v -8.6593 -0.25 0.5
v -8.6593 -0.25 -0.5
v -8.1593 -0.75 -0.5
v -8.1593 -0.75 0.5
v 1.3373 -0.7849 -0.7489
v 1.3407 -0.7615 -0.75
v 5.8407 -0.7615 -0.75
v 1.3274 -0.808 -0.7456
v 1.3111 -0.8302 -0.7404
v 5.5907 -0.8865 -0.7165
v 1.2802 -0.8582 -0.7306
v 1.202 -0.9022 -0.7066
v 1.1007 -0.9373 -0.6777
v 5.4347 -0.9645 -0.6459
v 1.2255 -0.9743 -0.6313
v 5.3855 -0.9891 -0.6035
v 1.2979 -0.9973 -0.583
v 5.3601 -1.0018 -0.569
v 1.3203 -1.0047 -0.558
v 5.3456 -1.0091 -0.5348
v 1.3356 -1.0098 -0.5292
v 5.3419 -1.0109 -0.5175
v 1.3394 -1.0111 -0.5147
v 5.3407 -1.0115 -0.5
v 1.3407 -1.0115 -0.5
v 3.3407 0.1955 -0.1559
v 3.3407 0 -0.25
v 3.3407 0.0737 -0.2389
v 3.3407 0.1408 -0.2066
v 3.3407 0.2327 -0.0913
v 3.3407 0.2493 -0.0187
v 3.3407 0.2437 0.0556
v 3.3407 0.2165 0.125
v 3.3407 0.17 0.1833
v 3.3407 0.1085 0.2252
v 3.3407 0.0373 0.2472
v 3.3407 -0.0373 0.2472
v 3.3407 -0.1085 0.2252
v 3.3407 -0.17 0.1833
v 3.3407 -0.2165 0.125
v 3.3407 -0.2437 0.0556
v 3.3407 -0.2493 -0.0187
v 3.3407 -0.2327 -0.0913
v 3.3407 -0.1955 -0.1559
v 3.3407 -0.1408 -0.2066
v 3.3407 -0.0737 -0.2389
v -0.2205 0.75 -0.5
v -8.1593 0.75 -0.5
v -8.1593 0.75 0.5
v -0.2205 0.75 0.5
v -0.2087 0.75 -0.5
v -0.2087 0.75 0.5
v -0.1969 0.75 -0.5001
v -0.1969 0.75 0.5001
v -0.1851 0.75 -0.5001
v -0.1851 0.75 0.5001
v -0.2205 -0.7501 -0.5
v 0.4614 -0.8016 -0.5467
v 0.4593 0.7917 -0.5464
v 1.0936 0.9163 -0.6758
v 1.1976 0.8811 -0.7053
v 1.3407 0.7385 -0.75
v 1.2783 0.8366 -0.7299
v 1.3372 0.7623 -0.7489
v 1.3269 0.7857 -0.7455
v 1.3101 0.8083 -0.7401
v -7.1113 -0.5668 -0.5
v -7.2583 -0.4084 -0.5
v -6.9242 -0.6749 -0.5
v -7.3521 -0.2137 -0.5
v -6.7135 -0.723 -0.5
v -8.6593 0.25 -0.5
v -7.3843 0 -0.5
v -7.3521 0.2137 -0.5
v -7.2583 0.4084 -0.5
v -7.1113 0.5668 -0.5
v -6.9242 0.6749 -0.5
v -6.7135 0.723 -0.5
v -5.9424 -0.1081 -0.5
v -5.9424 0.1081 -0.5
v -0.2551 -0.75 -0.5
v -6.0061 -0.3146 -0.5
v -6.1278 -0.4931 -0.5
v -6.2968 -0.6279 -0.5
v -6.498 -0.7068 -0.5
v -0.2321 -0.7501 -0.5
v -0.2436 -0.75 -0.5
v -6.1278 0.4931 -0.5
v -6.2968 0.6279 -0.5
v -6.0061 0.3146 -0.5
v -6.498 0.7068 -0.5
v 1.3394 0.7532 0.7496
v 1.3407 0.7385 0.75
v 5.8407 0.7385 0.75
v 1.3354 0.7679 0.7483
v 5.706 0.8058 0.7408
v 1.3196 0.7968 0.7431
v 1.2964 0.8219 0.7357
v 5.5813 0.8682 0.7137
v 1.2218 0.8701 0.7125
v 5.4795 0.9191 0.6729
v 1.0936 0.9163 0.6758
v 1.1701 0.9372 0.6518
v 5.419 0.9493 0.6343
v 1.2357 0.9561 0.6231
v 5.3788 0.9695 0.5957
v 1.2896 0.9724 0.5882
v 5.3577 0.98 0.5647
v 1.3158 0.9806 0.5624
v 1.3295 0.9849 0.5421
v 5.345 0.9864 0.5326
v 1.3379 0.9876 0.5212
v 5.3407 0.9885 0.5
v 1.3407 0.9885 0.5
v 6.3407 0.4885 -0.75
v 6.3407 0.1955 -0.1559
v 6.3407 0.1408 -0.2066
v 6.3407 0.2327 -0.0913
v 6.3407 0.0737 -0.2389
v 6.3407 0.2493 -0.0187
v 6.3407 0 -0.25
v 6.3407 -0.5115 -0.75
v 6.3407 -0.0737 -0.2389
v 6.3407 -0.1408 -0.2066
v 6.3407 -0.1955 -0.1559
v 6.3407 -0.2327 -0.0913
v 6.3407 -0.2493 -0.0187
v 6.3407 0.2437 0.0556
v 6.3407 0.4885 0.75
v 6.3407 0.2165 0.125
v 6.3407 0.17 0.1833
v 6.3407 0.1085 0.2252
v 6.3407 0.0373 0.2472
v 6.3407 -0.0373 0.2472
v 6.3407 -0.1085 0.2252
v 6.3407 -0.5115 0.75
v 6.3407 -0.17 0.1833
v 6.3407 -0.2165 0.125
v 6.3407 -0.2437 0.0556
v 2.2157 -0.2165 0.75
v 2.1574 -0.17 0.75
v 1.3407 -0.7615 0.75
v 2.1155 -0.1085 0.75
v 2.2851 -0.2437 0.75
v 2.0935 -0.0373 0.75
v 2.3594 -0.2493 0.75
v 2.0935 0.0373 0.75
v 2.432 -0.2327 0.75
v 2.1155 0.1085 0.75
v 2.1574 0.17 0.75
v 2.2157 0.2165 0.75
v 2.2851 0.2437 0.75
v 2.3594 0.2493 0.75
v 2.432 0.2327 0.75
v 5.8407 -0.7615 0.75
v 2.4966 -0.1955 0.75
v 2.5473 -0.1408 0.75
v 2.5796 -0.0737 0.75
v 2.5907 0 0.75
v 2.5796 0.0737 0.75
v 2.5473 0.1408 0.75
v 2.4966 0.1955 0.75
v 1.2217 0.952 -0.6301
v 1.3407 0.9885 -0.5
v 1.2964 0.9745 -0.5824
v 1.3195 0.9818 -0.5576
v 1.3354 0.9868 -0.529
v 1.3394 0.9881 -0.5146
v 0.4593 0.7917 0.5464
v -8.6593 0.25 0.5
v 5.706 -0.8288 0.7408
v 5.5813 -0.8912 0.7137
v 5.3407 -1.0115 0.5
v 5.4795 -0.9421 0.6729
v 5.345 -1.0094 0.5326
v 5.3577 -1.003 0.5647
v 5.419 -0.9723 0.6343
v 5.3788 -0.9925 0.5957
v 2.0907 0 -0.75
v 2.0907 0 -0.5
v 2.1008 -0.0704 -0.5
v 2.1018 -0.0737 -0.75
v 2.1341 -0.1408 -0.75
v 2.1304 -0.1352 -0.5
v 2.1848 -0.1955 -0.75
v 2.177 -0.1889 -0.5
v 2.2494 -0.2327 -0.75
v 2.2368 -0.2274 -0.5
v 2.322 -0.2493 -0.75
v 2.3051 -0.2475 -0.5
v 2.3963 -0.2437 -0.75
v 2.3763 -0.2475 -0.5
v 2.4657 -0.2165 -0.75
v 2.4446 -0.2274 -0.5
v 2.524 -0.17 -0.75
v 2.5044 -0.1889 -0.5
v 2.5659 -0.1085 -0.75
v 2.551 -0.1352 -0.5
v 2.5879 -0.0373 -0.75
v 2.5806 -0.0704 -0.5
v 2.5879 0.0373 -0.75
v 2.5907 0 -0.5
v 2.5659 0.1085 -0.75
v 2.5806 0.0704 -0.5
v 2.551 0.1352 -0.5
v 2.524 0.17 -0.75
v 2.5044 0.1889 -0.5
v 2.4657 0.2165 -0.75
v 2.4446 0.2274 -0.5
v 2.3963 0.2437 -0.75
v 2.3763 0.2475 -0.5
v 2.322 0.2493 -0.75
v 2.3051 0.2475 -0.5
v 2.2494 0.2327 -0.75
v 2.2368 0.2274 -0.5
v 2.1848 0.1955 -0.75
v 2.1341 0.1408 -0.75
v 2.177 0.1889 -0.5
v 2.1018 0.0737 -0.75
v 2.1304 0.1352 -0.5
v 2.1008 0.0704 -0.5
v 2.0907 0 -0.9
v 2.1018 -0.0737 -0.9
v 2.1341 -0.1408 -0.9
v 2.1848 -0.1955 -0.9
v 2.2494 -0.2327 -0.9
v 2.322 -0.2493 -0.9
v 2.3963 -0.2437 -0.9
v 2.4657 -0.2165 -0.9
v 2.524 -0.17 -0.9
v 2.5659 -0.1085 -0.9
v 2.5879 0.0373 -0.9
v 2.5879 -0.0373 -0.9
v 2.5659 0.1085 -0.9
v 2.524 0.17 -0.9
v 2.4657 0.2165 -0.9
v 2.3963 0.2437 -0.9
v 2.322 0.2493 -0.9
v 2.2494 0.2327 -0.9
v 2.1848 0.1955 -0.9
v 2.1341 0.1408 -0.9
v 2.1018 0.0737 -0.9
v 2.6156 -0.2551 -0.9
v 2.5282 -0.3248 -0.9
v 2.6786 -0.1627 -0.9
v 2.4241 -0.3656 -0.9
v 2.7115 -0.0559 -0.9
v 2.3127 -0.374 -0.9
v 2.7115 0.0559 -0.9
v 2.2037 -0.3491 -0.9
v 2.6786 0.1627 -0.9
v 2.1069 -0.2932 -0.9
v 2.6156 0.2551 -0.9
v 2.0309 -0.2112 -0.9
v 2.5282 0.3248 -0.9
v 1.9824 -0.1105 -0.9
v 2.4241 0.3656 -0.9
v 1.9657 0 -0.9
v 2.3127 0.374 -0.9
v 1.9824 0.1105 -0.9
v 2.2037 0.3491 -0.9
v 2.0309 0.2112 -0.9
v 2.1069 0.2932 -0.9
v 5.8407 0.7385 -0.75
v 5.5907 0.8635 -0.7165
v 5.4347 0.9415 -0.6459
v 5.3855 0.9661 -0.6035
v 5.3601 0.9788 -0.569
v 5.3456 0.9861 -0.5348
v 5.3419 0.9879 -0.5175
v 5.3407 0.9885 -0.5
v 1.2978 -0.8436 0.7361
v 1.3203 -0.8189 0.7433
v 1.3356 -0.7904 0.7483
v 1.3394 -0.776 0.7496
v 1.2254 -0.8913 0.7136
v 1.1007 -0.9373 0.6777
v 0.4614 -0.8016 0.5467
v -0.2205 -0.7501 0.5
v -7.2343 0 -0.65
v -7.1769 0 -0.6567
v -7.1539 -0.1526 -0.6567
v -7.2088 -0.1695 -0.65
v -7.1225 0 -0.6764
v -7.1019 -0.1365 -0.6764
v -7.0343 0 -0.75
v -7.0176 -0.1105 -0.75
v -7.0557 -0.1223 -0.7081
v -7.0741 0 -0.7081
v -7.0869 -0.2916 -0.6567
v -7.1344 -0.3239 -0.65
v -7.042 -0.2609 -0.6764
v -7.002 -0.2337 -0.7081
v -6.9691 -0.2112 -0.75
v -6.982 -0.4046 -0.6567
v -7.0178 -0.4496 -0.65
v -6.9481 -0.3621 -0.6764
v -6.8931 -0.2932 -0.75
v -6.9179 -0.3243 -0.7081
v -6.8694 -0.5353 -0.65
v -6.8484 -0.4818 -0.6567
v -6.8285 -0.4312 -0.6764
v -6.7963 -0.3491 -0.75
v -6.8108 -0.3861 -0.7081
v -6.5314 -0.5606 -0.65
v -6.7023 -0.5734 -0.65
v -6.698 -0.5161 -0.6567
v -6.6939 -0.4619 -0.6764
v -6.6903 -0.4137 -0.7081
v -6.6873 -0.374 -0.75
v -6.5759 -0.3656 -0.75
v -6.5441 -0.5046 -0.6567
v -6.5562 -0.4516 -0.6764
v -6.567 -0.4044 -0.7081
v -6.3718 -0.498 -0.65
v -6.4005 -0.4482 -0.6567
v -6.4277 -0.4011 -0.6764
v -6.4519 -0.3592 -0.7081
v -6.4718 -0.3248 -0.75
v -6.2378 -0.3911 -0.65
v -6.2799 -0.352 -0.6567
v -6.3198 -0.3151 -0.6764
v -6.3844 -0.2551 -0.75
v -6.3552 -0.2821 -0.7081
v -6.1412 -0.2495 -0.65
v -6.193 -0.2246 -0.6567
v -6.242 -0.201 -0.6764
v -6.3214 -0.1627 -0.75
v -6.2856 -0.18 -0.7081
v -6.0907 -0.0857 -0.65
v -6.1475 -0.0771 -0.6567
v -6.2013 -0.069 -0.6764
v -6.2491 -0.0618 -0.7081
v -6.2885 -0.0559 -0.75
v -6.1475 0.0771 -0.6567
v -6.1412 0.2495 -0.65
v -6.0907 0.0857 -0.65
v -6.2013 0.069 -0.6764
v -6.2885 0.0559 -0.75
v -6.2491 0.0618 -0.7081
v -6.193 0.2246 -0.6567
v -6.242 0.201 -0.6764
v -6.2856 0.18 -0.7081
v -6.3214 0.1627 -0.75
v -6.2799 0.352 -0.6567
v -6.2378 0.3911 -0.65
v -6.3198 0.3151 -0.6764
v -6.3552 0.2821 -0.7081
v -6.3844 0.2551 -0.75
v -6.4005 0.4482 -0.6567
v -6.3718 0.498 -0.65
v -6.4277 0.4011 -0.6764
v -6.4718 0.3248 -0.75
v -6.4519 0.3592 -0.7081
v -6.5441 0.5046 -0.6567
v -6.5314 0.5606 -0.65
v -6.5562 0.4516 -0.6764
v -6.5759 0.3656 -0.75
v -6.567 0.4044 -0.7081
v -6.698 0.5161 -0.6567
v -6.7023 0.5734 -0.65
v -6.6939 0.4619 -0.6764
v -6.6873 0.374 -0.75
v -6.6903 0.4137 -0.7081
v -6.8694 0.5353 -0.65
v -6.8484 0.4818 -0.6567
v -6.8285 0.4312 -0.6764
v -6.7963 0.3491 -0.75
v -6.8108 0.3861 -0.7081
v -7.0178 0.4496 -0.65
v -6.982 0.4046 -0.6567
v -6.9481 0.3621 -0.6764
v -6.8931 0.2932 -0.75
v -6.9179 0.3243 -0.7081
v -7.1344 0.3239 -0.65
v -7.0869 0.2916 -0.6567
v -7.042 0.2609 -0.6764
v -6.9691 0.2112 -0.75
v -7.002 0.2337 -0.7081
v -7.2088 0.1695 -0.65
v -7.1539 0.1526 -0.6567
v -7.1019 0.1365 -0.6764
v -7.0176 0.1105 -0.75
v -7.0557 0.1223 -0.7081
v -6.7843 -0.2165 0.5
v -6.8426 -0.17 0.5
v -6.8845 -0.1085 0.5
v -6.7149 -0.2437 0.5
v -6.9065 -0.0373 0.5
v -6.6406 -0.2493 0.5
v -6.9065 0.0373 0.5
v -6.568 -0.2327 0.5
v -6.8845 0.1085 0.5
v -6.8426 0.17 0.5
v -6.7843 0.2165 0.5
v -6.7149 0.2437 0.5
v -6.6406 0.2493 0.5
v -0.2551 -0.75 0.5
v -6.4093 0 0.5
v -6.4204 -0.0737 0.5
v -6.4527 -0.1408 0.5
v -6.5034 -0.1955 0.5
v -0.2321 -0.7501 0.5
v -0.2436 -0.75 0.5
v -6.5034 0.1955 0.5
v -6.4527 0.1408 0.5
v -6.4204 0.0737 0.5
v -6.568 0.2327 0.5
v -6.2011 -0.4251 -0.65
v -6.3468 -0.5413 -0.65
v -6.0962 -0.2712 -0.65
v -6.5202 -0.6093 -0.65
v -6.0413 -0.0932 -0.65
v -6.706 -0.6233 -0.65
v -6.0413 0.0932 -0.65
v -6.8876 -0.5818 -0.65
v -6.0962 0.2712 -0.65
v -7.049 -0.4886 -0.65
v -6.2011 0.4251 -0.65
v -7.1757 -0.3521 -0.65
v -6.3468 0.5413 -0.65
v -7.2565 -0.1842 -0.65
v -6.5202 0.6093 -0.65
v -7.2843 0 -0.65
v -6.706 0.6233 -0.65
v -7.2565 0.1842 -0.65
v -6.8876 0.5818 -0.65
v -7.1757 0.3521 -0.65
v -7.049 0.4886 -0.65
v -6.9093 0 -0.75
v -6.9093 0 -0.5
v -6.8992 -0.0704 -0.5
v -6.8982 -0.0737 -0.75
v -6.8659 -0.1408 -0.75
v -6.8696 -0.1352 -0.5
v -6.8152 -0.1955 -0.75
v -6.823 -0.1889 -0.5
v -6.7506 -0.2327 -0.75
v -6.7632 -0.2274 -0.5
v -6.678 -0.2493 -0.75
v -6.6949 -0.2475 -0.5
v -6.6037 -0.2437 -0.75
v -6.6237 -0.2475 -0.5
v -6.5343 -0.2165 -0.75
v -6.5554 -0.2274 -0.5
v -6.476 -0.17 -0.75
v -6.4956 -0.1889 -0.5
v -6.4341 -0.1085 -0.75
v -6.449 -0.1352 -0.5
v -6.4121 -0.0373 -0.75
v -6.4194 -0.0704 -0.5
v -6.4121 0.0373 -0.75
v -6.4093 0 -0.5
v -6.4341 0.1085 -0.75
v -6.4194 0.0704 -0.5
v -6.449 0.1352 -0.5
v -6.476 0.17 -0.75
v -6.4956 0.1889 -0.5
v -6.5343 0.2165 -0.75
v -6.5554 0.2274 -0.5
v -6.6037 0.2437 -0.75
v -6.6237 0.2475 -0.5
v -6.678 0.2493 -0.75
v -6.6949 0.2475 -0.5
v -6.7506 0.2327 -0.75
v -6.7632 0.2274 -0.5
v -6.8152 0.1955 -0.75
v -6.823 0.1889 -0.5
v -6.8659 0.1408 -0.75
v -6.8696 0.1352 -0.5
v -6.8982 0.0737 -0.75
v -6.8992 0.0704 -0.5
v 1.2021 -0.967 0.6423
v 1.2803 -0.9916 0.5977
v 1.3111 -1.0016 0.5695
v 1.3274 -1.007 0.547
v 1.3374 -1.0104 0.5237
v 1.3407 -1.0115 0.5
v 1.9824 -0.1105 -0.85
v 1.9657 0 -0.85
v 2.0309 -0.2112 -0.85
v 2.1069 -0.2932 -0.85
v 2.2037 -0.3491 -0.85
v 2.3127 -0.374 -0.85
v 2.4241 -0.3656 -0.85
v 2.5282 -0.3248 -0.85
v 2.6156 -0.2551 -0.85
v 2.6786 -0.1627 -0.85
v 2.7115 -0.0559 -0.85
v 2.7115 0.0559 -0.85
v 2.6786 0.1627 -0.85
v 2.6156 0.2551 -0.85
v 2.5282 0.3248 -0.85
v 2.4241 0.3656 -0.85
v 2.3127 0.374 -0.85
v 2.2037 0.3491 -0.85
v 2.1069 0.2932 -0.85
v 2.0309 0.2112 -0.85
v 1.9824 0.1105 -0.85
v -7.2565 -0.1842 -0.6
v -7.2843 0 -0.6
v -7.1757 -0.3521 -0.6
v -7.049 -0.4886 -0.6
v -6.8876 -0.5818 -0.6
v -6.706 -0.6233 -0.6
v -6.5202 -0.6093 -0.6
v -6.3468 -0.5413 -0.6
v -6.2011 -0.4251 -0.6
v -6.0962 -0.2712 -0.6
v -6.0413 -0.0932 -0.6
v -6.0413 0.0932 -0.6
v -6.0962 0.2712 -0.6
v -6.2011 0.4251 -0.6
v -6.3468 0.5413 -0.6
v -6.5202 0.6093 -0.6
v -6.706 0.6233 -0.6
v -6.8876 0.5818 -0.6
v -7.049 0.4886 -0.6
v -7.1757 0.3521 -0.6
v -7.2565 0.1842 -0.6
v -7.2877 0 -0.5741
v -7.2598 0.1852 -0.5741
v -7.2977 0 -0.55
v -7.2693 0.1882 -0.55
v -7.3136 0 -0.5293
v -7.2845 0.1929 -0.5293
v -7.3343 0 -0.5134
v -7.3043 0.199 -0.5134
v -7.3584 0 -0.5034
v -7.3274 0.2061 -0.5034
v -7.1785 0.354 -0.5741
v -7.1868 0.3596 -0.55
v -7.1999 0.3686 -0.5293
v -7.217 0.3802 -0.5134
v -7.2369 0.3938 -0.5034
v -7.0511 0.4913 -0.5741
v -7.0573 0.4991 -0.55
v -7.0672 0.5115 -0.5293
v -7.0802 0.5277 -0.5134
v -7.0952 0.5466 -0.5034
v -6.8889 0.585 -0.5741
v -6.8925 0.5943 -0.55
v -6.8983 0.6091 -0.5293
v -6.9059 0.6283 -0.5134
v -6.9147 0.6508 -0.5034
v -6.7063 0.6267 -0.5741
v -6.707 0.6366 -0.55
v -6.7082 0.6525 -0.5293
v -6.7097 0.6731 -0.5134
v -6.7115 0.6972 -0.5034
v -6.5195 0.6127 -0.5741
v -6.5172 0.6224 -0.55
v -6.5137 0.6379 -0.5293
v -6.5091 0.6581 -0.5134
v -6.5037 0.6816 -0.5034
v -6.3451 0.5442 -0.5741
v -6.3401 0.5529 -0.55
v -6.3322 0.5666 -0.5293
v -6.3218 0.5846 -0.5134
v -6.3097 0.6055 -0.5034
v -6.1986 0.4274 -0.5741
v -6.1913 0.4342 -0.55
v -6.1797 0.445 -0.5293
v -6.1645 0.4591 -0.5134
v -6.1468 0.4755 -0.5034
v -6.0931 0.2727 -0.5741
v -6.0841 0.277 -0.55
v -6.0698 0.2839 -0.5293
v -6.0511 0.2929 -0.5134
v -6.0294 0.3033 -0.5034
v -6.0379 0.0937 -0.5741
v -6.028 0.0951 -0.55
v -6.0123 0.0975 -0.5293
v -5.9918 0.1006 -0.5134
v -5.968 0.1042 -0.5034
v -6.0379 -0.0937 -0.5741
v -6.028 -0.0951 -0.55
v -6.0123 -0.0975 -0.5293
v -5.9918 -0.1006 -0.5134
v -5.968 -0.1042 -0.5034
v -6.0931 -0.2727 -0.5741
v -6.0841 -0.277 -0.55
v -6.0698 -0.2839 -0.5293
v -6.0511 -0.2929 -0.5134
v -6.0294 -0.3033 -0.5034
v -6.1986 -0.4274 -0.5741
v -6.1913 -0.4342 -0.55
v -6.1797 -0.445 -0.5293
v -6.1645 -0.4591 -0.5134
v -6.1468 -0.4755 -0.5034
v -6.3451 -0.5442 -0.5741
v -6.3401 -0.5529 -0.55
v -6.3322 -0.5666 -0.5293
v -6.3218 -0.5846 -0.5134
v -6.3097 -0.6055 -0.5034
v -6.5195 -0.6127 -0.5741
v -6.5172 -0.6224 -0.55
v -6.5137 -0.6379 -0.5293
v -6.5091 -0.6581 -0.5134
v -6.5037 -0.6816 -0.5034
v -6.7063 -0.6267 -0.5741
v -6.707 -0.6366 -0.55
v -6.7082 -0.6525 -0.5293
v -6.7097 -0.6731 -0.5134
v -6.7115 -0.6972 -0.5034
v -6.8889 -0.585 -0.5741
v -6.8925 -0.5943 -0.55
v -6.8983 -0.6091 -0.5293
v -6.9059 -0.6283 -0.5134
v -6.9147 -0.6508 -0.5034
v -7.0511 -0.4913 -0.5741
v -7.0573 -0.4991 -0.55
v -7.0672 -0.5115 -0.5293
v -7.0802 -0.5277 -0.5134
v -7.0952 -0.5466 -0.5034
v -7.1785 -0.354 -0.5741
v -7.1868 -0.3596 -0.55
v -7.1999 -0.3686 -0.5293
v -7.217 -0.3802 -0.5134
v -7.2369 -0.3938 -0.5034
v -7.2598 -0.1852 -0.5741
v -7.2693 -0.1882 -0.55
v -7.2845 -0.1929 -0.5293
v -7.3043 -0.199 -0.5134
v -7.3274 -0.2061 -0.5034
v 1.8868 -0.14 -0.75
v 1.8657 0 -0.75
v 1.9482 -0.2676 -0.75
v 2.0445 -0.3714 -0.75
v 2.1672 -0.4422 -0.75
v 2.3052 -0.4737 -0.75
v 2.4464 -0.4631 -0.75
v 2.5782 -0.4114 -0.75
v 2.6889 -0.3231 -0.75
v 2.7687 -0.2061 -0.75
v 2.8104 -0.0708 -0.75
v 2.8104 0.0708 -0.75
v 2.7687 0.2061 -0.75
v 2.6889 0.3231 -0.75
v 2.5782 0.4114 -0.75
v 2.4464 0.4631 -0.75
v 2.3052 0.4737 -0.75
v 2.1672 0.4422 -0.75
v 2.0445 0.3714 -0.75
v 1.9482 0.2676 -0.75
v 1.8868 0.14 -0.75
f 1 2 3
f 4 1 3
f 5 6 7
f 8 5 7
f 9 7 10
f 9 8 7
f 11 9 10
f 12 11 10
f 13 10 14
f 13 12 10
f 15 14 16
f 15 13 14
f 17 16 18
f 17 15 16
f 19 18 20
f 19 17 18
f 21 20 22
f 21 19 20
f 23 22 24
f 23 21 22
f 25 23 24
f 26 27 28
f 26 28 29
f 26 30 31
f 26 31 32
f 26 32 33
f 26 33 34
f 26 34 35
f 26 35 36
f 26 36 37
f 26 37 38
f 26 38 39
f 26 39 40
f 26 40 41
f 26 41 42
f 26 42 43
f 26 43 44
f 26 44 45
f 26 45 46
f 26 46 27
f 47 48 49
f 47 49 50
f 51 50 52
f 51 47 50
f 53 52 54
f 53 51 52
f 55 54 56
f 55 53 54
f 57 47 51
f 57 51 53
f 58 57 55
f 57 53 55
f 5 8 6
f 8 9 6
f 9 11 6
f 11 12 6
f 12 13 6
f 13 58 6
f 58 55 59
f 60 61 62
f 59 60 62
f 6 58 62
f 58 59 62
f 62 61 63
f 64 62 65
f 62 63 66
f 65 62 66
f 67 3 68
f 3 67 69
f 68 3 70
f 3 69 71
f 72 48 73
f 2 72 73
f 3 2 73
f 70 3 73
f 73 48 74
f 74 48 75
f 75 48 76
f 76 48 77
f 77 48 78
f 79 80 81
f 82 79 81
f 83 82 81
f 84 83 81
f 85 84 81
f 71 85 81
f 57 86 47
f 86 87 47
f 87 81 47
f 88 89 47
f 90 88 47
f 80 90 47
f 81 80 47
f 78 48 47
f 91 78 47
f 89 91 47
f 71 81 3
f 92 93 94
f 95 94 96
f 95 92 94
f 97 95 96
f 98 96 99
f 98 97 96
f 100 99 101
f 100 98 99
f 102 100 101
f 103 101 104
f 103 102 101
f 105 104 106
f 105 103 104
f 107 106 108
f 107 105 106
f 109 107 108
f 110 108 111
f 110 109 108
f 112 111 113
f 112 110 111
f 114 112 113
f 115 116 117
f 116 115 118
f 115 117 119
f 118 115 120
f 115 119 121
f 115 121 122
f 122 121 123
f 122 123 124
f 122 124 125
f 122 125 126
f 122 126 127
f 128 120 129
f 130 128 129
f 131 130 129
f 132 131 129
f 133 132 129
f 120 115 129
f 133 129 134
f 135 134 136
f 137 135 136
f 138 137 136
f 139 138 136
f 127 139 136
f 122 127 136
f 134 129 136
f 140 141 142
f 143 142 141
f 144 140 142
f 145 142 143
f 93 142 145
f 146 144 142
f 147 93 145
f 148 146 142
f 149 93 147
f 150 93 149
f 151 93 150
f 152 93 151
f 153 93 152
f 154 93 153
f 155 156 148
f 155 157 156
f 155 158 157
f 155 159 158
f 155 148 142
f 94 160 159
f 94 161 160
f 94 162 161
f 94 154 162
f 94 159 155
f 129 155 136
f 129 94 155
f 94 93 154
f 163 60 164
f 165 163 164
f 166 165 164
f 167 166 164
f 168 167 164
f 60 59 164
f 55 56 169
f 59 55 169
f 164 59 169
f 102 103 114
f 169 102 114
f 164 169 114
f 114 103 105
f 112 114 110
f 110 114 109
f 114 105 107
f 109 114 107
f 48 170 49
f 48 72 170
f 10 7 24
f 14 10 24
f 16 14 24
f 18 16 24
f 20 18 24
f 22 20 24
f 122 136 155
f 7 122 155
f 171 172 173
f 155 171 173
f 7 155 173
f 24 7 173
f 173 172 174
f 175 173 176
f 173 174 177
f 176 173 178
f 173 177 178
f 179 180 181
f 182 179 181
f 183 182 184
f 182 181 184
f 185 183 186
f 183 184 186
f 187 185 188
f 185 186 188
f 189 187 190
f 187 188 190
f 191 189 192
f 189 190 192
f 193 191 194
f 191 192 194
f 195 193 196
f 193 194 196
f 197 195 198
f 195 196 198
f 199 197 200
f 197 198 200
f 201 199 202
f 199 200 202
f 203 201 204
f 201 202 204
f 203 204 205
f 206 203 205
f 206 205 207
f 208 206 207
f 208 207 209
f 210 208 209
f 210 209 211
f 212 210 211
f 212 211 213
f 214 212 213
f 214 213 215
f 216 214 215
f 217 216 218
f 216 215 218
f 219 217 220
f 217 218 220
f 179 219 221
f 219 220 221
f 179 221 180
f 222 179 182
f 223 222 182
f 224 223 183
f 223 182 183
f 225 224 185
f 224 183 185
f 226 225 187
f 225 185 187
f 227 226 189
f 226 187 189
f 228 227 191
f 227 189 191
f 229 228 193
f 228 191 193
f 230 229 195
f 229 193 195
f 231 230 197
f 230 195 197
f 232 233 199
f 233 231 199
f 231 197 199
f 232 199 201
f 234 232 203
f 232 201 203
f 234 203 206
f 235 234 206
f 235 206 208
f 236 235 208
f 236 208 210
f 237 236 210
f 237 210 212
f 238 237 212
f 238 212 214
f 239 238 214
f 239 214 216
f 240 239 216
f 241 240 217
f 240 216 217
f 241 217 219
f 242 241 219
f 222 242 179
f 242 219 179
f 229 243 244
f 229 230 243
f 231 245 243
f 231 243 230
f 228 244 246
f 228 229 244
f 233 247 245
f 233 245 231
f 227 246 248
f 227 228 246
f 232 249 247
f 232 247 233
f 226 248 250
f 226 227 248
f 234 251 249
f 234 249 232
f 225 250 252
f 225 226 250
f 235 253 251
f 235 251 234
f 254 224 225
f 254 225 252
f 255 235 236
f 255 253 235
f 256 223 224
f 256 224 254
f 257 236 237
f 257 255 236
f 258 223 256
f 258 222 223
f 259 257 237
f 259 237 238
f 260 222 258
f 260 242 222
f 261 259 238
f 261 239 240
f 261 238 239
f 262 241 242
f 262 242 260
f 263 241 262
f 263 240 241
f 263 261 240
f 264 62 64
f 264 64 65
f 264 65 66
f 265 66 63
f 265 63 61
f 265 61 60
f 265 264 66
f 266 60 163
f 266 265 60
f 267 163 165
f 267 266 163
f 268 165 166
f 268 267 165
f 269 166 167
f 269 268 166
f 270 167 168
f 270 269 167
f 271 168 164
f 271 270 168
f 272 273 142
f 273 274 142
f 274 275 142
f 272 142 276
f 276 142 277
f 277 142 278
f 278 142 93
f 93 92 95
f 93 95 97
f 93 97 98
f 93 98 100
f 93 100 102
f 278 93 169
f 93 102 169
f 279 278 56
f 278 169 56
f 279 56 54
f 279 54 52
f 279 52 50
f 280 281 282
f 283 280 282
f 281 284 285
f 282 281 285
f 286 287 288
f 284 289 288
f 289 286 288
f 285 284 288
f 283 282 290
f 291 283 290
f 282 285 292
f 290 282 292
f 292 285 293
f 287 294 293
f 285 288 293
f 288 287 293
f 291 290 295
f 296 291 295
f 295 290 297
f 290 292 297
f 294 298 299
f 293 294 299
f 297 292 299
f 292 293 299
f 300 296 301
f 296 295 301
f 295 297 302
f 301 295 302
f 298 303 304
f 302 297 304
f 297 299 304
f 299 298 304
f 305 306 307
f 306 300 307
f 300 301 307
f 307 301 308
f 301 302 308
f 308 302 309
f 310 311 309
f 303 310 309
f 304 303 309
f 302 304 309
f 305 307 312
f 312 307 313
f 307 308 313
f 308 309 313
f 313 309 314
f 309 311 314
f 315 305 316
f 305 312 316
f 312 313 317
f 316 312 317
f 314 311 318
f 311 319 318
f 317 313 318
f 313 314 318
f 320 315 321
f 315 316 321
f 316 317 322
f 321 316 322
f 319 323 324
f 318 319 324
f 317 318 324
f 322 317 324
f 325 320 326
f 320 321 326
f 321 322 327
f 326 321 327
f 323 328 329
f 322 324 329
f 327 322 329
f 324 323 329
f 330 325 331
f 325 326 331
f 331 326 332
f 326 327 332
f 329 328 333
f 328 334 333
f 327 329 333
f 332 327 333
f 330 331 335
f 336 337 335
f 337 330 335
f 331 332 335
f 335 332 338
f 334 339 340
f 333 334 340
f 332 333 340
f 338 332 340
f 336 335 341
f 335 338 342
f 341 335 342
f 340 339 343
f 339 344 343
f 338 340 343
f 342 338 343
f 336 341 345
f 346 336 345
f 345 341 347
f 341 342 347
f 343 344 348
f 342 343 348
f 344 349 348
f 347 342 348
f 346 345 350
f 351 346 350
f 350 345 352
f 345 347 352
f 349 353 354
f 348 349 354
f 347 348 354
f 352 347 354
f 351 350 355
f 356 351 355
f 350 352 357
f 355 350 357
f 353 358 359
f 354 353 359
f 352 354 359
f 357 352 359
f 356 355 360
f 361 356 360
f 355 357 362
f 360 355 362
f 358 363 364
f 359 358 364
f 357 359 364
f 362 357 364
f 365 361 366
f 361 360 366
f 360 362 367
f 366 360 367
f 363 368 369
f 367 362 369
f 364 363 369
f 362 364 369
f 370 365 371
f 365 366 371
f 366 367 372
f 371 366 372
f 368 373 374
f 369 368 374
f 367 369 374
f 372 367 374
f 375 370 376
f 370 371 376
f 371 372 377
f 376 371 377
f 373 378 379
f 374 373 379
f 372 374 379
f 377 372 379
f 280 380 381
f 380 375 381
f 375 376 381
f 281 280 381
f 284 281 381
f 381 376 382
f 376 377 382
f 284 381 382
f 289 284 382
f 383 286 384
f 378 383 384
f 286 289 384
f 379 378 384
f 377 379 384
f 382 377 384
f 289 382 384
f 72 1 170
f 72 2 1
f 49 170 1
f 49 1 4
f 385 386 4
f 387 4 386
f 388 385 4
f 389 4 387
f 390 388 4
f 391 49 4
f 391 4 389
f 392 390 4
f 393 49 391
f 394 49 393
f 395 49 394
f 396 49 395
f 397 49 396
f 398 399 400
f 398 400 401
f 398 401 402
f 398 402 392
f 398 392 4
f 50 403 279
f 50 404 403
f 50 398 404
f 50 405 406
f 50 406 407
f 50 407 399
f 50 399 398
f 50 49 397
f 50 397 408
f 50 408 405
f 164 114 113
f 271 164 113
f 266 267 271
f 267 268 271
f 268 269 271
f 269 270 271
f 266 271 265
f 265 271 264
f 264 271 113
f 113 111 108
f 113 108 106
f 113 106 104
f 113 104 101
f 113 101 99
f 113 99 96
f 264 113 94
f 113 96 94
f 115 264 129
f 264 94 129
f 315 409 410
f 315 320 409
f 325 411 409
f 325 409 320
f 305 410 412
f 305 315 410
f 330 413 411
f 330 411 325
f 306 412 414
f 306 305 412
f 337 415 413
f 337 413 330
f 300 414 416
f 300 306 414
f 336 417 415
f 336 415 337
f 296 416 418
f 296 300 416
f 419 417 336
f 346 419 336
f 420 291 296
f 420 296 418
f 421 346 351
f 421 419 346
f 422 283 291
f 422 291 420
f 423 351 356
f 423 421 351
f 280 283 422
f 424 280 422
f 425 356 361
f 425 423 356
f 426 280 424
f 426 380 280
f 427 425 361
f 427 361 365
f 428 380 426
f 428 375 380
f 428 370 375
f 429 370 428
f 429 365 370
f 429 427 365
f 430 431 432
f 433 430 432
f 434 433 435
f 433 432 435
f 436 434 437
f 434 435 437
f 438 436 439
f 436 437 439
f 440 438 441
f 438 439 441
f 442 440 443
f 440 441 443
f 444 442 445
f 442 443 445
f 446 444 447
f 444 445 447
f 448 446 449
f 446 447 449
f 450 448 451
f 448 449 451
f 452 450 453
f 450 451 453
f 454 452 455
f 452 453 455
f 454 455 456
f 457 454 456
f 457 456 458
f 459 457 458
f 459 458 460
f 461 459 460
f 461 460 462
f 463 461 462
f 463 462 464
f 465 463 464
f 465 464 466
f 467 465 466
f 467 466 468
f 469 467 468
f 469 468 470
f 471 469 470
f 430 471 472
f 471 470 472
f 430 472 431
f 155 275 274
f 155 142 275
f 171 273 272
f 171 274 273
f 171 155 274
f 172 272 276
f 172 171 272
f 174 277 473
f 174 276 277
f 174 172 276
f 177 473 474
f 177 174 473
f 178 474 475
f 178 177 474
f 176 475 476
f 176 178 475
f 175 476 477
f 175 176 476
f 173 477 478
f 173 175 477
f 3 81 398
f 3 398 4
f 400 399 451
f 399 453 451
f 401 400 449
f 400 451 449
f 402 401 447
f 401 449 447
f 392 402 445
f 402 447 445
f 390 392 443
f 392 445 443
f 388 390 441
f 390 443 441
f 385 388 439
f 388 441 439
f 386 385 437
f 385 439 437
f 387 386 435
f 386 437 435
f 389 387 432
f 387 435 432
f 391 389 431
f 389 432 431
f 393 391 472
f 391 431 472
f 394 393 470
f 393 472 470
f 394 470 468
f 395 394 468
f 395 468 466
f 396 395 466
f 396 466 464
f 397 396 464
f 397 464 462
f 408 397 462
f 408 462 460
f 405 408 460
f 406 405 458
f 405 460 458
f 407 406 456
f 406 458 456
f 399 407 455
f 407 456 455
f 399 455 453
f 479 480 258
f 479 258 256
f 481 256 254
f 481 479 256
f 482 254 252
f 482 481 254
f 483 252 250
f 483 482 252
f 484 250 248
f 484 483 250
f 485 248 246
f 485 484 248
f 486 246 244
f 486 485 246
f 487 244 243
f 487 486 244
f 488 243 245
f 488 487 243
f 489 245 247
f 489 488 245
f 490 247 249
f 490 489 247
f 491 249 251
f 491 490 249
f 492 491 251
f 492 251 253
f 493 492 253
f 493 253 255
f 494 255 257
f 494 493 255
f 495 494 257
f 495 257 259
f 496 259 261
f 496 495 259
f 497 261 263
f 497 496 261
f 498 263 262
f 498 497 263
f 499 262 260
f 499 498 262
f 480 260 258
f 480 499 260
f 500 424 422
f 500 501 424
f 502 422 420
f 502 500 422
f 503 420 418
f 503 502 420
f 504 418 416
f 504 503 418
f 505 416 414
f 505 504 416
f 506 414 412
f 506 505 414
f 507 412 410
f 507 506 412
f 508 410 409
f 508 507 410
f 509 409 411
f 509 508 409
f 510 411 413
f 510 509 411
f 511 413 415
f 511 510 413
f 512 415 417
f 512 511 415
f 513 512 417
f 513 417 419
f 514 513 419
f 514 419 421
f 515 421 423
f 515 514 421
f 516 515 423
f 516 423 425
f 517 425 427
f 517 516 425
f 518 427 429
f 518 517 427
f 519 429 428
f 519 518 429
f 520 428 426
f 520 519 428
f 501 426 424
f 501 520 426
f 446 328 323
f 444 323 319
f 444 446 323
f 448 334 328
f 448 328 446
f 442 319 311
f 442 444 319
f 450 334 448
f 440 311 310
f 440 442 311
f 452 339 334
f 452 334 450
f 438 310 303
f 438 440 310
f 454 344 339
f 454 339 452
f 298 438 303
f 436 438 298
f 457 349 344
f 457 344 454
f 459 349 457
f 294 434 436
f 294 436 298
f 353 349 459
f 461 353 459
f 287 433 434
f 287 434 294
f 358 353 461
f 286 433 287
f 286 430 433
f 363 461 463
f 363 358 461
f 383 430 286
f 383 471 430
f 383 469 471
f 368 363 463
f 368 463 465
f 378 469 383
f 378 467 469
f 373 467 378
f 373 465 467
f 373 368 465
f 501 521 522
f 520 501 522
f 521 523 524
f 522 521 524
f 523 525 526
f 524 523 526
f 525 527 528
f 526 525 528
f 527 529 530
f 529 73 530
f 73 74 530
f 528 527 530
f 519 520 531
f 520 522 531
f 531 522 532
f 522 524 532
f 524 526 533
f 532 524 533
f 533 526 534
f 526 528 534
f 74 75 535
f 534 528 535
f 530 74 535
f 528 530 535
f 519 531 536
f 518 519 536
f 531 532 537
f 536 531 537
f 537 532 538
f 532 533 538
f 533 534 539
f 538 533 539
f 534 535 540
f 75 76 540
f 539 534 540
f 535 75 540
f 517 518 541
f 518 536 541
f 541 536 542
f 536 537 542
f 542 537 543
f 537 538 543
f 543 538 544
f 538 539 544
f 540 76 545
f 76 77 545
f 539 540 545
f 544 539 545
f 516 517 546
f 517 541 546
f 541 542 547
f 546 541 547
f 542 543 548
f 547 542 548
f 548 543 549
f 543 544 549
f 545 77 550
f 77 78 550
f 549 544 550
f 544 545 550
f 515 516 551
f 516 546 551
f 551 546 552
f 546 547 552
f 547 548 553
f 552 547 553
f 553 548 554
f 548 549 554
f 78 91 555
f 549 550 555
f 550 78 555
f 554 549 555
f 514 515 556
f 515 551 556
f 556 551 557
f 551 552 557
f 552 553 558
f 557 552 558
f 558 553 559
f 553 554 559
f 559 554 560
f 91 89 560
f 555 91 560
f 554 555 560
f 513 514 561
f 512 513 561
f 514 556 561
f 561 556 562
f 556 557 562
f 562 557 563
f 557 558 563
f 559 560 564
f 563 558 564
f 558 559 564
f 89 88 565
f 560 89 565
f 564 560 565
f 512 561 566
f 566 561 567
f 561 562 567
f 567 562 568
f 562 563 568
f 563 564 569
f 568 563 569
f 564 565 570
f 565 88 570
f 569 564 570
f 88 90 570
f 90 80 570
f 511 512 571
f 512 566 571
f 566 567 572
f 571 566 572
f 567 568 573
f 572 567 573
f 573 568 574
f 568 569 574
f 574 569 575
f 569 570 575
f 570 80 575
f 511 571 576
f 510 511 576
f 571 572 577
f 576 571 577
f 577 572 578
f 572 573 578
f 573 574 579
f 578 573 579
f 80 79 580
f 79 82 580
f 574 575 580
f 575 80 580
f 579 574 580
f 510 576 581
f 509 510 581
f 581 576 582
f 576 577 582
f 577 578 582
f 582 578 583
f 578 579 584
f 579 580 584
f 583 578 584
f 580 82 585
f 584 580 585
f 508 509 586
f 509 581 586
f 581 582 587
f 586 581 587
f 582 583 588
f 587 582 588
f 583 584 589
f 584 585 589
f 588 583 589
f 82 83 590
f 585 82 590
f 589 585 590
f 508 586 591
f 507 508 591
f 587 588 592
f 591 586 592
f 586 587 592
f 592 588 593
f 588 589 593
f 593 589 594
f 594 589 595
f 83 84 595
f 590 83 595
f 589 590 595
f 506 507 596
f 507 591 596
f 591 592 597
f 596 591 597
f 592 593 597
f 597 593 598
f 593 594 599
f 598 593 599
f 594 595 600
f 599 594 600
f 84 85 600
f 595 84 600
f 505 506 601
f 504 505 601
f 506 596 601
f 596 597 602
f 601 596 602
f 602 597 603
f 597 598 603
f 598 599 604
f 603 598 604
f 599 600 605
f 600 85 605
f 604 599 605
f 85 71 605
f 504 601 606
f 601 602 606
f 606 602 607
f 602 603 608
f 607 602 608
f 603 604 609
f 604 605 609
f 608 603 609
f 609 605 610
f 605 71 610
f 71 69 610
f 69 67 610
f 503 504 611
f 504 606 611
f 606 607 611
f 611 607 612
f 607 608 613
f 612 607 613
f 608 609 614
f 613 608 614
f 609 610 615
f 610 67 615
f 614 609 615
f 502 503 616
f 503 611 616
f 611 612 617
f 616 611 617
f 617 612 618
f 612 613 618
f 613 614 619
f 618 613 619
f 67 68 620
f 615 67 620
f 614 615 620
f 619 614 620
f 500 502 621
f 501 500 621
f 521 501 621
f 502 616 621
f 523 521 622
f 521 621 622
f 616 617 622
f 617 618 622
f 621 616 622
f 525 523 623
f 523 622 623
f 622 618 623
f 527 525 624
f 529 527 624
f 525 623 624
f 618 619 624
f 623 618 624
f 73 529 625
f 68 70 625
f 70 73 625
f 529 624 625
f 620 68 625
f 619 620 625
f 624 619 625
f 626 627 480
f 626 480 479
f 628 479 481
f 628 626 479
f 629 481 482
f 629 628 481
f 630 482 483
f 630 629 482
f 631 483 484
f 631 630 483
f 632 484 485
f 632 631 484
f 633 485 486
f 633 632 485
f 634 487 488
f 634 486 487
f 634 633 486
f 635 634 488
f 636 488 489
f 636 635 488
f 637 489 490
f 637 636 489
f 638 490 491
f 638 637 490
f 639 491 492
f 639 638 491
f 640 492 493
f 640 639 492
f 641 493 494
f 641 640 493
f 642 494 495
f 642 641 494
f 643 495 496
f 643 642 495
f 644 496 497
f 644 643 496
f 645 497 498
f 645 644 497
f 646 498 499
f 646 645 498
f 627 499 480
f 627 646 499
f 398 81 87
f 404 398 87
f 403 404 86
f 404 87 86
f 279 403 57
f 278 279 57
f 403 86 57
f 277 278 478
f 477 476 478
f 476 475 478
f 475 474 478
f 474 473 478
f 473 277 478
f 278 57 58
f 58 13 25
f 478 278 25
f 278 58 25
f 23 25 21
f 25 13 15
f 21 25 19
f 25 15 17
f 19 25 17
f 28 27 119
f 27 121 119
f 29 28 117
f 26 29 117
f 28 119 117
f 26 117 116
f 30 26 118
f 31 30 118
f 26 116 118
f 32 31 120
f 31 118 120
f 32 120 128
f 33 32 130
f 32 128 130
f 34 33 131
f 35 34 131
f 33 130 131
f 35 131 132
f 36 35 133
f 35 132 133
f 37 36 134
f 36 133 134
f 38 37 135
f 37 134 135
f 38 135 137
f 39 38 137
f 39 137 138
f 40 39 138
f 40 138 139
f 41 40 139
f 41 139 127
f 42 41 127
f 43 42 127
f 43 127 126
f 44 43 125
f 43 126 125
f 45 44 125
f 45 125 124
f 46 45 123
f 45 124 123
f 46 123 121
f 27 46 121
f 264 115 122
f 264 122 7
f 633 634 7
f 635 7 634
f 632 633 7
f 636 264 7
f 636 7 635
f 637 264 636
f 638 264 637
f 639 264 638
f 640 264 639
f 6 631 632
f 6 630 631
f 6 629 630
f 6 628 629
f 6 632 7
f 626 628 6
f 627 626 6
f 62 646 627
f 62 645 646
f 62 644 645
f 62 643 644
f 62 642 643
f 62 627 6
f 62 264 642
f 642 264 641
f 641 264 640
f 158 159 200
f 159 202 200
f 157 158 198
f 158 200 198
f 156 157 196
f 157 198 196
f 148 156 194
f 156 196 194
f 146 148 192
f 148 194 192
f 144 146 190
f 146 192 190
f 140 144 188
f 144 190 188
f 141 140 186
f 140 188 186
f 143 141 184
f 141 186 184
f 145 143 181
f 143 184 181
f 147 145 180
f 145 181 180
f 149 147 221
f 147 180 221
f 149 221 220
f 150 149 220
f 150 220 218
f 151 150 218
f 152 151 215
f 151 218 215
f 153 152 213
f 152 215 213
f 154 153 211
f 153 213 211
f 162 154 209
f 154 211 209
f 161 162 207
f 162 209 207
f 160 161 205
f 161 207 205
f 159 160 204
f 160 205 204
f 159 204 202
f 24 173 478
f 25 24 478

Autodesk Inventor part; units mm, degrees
ref_plane "YZ Plane" through (0, 0, 0) normal (1, 0, 0) x (0, 1, 0)
ref_plane "XZ Plane" through (0, 0, 0) normal (0, 1, 0) x (-1, 0, 0)
ref_plane "XY Plane" through (0, 0, 0) normal (0, 0, 1) x (1, 0, 0)
sketch "Sketch1" plane through (0, 0, 0) normal (0, 0, 1) x (1, 0, 0)
  line L0 (-8.1593, 0.75) -> (1.3407, 0.75)
  line L1 (1.3407, -0.75) -> (-8.1593, -0.75)
  line L2 (-8.6593, -0.25) -> (-8.6593, 0.25)
  circle A0 centre (-6.6593, 0) radius 0.25
  circle A1 centre (2.3407, 0) radius 0.25
  line L3 (-11.6593, 0) -> (9.3407, 0) projected
  line L4 (1.3407, -0.75) -> (1.3407, -1.0115)
  line L5 (1.3407, 0.75) -> (1.3407, 0.9885)
  line L6 (-8.1593, 0.75) -> (-8.1593, 0.75)
  line L7 (-8.6593, 0.25) -> (-8.6593, 0.25)
  line L8 (-8.1593, -0.75) -> (-8.1593, -0.75)
  line L9 (-8.6593, -0.25) -> (-8.6593, -0.25)
  line L10 (1.3407, 0.9885) -> (5.3407, 0.9885)
  line L11 (6.3407, 0.4885) -> (6.3407, -0.5115)
  line L12 (1.3407, -1.0115) -> (5.3407, -1.0115)
  line L13 (5.3407, -1.0115) -> (6.3407, -0.5115)
  line L14 (5.3407, 0.9885) -> (6.3407, 0.4885)
  line L15 (-8.6593, 0.25) -> (-8.1593, 0.75)
  line L16 (-8.6593, -0.25) -> (-8.1593, -0.75)
  point P0 (0, 0)
  point P1 (-8.6593, 0.75)
  point P2 (-8.6593, -0.75)
  point P3 (6.3407, -1.0115)
  point P4 (6.3407, 0.9885)
  point P5 (-8.6593, 0)
  point P6 (6.3407, 0.9885)
  dimension "d2" = 0.5
  dimension "d4" = 0.5
  dimension "d34" = 9
  dimension "d36" = 1.5
  dimension "d37" = 2
  dimension "d38" = 2
  dimension "d39" = 8
  dimension "d40" = 5
  dimension "d56" = 1
  dimension "d57" = 0.5
  dimension "d58" = 1
  dimension "d59" = 0.5
  dimension "d60" = 0.5
  dimension "d61" = 0.5
  dimension "d62" = 0.5
  dimension "d63" = 0.5
extrude "Extrusion1" add sketch "Sketch1" along normal mid plane 1 contours L0 L5 L10 L14 L11 L3 A1 A0 L2 L15 | L3 A0 A1 L11 L13 L12 L4 L1 L16 L2
sketch "Sketch2" plane through (0, 0, 0.5) normal (0, 0, 1) x (1, 0, 0)
  circle A0 centre (2.3407, 0) radius 0.25 projected
  circle A1 centre (-6.6593, 0) radius 0.25 projected
  line L0 (1.3407, 0.75) -> (-8.1593, 0.75) projected
  line L1 (-8.6593, 0.25) -> (-8.6593, -0.25) projected
  line L2 (-8.1593, -0.75) -> (1.3407, -0.75) projected
  line L3 (1.3407, 0.75) -> (-8.1593, 0.75) projected
  line L4 (1.3407, 0.75) -> (1.3407, -0.75)
  line L5 (1.3407, -0.75) -> (1.3407, -1.0115) projected
  line L6 (1.3407, 0.9885) -> (1.3407, 0.75) projected
  line L7 (1.3407, -1.0115) -> (5.3407, -1.0115) projected
  line L8 (5.3407, -1.0115) -> (6.3407, -0.5115) projected
  line L9 (6.3407, -0.5115) -> (6.3407, 0.4885) projected
  line L10 (6.3407, 0.4885) -> (5.3407, 0.9885) projected
  line L11 (5.3407, 0.9885) -> (1.3407, 0.9885) projected
  line L12 (-8.1593, 0.75) -> (-8.6593, 0.25) projected
  line L13 (-8.6593, -0.25) -> (-8.1593, -0.75) projected
  point P0 (0, 0)
  point P1 (-8.6593, 0.75)
extrude "Extrusion2" add sketch "Sketch2" along normal blind 0.25 contours L6 L11 L10 L9 L8 L7 L5 L4
sketch "Sketch3" plane through (0, 0, -0.5) normal (0, 0, -1) x (-1, 0, 0)
  circle A0 centre (-2.3407, 0) radius 0.25 projected
  circle A1 centre (6.6593, 0) radius 0.25 projected
  line L0 (8.1593, 0.75) -> (-1.3407, 0.75) projected
  line L1 (-1.3407, -0.75) -> (8.1593, -0.75) projected
  line L2 (8.6593, -0.25) -> (8.6593, 0.25) projected
  line L3 (-0.3407, -0.75) -> (-0.3407, 0.75) projected
  line L4 (8.1593, -0.75) -> (-1.3407, -0.75) projected
  line L5 (-1.3407, 0.75) -> (-1.3407, -0.75)
  line L6 (-1.3407, 0.75) -> (-1.3407, 0.9885) projected
  line L7 (-1.3407, -1.0115) -> (-1.3407, -0.75) projected
  line L8 (8.1593, -0.75) -> (8.6593, -0.25) projected
  line L9 (8.6593, 0.25) -> (8.1593, 0.75) projected
  line L10 (-1.3407, 0.9885) -> (-5.3407, 0.9885) projected
  line L11 (-5.3407, 0.9885) -> (-6.3407, 0.4885) projected
  line L12 (-6.3407, 0.4885) -> (-6.3407, -0.5115) projected
  line L13 (-6.3407, -0.5115) -> (-5.3407, -1.0115) projected
  line L14 (-5.3407, -1.0115) -> (-1.3407, -1.0115) projected
  point P0 (0, 0)
  point P1 (8.6593, -0.75)
extrude "Extrusion3" add sketch "Sketch3" along normal blind 0.25 contours L5 L7 L14 L13 L12 L11 L10 L6
fillet "Fillet5" radius 5 4 edges at (1.3407, 0, 0.5) (1.3407, 0.75, 0) (1.3407, -0.75, 0) (1.3407, 0, -0.5)
sketch "Sketch10" plane through (0, 0, -0.75) normal (0, 0, -1) x (-1, 0, 0)
  circle A0 centre (-2.3407, 0) radius 0.25 projected
  circle A1 centre (-2.3407, 0) radius 0.375
  circle A2 centre (-2.3407, 0) radius 0.5
  point P0 (0, 0)
  dimension "d48" = 0.75
  dimension "d49" = 1
extrude "Extrusion10" add sketch "Sketch10" along normal blind 0.15 contours A1
chamfer "Chamfer1" distance 0.1 angle 45 1 edges at (2.7157, 0, -0.75) measured on face at (4.4657, -0.0077, -0.75)
fillet "Fillet6" radius 0.25 1 edges at (3.3407, 0.9885, -0.75)
fillet "Fillet7" radius 0.25 3 edges at (3.3407, -1.0115, -0.75) (3.3407, -1.0115, 0.75) (3.3407, 0.9885, 0.75)
sketch "Sketch12" plane through (0, 0, -0.5) normal (0, 0, -1) x (-1, 0, 0)
  circle A0 centre (6.6593, 0) radius 0.25 projected
  circle A1 centre (6.6593, 0) radius 0.625
  circle A2 centre (6.6593, 0) radius 0.375
  point P0 (0, 0)
  dimension "d66" = 1.25
  dimension "d67" = 0.75
extrude "Extrusion11" add sketch "Sketch12" along normal blind 0.25 contours A2
extrude "Extrusion12" add sketch "Sketch12" along normal blind 0.15 contours A1
fillet "Fillet8" radius 0.25 1 edges at (-6.2843, 0, -0.65)
fillet "Fillet9" radius 0.1 1 edges at (-6.0343, 0, -0.5)
sketch "Sketch14" plane through (6.3407, -0.5115, 0.75) normal (1, 0, 0) x (0, 0, -1)
  circle A0 centre (0.75, 0.5115) radius 0.25
  dimension "d77" = 0.5
extrude "Extrusion13" cut sketch "Sketch14" against normal blind 3
equation "\"d62\" = d60"
equation "\"d63\" = d61"
properties part number "Link_3"
